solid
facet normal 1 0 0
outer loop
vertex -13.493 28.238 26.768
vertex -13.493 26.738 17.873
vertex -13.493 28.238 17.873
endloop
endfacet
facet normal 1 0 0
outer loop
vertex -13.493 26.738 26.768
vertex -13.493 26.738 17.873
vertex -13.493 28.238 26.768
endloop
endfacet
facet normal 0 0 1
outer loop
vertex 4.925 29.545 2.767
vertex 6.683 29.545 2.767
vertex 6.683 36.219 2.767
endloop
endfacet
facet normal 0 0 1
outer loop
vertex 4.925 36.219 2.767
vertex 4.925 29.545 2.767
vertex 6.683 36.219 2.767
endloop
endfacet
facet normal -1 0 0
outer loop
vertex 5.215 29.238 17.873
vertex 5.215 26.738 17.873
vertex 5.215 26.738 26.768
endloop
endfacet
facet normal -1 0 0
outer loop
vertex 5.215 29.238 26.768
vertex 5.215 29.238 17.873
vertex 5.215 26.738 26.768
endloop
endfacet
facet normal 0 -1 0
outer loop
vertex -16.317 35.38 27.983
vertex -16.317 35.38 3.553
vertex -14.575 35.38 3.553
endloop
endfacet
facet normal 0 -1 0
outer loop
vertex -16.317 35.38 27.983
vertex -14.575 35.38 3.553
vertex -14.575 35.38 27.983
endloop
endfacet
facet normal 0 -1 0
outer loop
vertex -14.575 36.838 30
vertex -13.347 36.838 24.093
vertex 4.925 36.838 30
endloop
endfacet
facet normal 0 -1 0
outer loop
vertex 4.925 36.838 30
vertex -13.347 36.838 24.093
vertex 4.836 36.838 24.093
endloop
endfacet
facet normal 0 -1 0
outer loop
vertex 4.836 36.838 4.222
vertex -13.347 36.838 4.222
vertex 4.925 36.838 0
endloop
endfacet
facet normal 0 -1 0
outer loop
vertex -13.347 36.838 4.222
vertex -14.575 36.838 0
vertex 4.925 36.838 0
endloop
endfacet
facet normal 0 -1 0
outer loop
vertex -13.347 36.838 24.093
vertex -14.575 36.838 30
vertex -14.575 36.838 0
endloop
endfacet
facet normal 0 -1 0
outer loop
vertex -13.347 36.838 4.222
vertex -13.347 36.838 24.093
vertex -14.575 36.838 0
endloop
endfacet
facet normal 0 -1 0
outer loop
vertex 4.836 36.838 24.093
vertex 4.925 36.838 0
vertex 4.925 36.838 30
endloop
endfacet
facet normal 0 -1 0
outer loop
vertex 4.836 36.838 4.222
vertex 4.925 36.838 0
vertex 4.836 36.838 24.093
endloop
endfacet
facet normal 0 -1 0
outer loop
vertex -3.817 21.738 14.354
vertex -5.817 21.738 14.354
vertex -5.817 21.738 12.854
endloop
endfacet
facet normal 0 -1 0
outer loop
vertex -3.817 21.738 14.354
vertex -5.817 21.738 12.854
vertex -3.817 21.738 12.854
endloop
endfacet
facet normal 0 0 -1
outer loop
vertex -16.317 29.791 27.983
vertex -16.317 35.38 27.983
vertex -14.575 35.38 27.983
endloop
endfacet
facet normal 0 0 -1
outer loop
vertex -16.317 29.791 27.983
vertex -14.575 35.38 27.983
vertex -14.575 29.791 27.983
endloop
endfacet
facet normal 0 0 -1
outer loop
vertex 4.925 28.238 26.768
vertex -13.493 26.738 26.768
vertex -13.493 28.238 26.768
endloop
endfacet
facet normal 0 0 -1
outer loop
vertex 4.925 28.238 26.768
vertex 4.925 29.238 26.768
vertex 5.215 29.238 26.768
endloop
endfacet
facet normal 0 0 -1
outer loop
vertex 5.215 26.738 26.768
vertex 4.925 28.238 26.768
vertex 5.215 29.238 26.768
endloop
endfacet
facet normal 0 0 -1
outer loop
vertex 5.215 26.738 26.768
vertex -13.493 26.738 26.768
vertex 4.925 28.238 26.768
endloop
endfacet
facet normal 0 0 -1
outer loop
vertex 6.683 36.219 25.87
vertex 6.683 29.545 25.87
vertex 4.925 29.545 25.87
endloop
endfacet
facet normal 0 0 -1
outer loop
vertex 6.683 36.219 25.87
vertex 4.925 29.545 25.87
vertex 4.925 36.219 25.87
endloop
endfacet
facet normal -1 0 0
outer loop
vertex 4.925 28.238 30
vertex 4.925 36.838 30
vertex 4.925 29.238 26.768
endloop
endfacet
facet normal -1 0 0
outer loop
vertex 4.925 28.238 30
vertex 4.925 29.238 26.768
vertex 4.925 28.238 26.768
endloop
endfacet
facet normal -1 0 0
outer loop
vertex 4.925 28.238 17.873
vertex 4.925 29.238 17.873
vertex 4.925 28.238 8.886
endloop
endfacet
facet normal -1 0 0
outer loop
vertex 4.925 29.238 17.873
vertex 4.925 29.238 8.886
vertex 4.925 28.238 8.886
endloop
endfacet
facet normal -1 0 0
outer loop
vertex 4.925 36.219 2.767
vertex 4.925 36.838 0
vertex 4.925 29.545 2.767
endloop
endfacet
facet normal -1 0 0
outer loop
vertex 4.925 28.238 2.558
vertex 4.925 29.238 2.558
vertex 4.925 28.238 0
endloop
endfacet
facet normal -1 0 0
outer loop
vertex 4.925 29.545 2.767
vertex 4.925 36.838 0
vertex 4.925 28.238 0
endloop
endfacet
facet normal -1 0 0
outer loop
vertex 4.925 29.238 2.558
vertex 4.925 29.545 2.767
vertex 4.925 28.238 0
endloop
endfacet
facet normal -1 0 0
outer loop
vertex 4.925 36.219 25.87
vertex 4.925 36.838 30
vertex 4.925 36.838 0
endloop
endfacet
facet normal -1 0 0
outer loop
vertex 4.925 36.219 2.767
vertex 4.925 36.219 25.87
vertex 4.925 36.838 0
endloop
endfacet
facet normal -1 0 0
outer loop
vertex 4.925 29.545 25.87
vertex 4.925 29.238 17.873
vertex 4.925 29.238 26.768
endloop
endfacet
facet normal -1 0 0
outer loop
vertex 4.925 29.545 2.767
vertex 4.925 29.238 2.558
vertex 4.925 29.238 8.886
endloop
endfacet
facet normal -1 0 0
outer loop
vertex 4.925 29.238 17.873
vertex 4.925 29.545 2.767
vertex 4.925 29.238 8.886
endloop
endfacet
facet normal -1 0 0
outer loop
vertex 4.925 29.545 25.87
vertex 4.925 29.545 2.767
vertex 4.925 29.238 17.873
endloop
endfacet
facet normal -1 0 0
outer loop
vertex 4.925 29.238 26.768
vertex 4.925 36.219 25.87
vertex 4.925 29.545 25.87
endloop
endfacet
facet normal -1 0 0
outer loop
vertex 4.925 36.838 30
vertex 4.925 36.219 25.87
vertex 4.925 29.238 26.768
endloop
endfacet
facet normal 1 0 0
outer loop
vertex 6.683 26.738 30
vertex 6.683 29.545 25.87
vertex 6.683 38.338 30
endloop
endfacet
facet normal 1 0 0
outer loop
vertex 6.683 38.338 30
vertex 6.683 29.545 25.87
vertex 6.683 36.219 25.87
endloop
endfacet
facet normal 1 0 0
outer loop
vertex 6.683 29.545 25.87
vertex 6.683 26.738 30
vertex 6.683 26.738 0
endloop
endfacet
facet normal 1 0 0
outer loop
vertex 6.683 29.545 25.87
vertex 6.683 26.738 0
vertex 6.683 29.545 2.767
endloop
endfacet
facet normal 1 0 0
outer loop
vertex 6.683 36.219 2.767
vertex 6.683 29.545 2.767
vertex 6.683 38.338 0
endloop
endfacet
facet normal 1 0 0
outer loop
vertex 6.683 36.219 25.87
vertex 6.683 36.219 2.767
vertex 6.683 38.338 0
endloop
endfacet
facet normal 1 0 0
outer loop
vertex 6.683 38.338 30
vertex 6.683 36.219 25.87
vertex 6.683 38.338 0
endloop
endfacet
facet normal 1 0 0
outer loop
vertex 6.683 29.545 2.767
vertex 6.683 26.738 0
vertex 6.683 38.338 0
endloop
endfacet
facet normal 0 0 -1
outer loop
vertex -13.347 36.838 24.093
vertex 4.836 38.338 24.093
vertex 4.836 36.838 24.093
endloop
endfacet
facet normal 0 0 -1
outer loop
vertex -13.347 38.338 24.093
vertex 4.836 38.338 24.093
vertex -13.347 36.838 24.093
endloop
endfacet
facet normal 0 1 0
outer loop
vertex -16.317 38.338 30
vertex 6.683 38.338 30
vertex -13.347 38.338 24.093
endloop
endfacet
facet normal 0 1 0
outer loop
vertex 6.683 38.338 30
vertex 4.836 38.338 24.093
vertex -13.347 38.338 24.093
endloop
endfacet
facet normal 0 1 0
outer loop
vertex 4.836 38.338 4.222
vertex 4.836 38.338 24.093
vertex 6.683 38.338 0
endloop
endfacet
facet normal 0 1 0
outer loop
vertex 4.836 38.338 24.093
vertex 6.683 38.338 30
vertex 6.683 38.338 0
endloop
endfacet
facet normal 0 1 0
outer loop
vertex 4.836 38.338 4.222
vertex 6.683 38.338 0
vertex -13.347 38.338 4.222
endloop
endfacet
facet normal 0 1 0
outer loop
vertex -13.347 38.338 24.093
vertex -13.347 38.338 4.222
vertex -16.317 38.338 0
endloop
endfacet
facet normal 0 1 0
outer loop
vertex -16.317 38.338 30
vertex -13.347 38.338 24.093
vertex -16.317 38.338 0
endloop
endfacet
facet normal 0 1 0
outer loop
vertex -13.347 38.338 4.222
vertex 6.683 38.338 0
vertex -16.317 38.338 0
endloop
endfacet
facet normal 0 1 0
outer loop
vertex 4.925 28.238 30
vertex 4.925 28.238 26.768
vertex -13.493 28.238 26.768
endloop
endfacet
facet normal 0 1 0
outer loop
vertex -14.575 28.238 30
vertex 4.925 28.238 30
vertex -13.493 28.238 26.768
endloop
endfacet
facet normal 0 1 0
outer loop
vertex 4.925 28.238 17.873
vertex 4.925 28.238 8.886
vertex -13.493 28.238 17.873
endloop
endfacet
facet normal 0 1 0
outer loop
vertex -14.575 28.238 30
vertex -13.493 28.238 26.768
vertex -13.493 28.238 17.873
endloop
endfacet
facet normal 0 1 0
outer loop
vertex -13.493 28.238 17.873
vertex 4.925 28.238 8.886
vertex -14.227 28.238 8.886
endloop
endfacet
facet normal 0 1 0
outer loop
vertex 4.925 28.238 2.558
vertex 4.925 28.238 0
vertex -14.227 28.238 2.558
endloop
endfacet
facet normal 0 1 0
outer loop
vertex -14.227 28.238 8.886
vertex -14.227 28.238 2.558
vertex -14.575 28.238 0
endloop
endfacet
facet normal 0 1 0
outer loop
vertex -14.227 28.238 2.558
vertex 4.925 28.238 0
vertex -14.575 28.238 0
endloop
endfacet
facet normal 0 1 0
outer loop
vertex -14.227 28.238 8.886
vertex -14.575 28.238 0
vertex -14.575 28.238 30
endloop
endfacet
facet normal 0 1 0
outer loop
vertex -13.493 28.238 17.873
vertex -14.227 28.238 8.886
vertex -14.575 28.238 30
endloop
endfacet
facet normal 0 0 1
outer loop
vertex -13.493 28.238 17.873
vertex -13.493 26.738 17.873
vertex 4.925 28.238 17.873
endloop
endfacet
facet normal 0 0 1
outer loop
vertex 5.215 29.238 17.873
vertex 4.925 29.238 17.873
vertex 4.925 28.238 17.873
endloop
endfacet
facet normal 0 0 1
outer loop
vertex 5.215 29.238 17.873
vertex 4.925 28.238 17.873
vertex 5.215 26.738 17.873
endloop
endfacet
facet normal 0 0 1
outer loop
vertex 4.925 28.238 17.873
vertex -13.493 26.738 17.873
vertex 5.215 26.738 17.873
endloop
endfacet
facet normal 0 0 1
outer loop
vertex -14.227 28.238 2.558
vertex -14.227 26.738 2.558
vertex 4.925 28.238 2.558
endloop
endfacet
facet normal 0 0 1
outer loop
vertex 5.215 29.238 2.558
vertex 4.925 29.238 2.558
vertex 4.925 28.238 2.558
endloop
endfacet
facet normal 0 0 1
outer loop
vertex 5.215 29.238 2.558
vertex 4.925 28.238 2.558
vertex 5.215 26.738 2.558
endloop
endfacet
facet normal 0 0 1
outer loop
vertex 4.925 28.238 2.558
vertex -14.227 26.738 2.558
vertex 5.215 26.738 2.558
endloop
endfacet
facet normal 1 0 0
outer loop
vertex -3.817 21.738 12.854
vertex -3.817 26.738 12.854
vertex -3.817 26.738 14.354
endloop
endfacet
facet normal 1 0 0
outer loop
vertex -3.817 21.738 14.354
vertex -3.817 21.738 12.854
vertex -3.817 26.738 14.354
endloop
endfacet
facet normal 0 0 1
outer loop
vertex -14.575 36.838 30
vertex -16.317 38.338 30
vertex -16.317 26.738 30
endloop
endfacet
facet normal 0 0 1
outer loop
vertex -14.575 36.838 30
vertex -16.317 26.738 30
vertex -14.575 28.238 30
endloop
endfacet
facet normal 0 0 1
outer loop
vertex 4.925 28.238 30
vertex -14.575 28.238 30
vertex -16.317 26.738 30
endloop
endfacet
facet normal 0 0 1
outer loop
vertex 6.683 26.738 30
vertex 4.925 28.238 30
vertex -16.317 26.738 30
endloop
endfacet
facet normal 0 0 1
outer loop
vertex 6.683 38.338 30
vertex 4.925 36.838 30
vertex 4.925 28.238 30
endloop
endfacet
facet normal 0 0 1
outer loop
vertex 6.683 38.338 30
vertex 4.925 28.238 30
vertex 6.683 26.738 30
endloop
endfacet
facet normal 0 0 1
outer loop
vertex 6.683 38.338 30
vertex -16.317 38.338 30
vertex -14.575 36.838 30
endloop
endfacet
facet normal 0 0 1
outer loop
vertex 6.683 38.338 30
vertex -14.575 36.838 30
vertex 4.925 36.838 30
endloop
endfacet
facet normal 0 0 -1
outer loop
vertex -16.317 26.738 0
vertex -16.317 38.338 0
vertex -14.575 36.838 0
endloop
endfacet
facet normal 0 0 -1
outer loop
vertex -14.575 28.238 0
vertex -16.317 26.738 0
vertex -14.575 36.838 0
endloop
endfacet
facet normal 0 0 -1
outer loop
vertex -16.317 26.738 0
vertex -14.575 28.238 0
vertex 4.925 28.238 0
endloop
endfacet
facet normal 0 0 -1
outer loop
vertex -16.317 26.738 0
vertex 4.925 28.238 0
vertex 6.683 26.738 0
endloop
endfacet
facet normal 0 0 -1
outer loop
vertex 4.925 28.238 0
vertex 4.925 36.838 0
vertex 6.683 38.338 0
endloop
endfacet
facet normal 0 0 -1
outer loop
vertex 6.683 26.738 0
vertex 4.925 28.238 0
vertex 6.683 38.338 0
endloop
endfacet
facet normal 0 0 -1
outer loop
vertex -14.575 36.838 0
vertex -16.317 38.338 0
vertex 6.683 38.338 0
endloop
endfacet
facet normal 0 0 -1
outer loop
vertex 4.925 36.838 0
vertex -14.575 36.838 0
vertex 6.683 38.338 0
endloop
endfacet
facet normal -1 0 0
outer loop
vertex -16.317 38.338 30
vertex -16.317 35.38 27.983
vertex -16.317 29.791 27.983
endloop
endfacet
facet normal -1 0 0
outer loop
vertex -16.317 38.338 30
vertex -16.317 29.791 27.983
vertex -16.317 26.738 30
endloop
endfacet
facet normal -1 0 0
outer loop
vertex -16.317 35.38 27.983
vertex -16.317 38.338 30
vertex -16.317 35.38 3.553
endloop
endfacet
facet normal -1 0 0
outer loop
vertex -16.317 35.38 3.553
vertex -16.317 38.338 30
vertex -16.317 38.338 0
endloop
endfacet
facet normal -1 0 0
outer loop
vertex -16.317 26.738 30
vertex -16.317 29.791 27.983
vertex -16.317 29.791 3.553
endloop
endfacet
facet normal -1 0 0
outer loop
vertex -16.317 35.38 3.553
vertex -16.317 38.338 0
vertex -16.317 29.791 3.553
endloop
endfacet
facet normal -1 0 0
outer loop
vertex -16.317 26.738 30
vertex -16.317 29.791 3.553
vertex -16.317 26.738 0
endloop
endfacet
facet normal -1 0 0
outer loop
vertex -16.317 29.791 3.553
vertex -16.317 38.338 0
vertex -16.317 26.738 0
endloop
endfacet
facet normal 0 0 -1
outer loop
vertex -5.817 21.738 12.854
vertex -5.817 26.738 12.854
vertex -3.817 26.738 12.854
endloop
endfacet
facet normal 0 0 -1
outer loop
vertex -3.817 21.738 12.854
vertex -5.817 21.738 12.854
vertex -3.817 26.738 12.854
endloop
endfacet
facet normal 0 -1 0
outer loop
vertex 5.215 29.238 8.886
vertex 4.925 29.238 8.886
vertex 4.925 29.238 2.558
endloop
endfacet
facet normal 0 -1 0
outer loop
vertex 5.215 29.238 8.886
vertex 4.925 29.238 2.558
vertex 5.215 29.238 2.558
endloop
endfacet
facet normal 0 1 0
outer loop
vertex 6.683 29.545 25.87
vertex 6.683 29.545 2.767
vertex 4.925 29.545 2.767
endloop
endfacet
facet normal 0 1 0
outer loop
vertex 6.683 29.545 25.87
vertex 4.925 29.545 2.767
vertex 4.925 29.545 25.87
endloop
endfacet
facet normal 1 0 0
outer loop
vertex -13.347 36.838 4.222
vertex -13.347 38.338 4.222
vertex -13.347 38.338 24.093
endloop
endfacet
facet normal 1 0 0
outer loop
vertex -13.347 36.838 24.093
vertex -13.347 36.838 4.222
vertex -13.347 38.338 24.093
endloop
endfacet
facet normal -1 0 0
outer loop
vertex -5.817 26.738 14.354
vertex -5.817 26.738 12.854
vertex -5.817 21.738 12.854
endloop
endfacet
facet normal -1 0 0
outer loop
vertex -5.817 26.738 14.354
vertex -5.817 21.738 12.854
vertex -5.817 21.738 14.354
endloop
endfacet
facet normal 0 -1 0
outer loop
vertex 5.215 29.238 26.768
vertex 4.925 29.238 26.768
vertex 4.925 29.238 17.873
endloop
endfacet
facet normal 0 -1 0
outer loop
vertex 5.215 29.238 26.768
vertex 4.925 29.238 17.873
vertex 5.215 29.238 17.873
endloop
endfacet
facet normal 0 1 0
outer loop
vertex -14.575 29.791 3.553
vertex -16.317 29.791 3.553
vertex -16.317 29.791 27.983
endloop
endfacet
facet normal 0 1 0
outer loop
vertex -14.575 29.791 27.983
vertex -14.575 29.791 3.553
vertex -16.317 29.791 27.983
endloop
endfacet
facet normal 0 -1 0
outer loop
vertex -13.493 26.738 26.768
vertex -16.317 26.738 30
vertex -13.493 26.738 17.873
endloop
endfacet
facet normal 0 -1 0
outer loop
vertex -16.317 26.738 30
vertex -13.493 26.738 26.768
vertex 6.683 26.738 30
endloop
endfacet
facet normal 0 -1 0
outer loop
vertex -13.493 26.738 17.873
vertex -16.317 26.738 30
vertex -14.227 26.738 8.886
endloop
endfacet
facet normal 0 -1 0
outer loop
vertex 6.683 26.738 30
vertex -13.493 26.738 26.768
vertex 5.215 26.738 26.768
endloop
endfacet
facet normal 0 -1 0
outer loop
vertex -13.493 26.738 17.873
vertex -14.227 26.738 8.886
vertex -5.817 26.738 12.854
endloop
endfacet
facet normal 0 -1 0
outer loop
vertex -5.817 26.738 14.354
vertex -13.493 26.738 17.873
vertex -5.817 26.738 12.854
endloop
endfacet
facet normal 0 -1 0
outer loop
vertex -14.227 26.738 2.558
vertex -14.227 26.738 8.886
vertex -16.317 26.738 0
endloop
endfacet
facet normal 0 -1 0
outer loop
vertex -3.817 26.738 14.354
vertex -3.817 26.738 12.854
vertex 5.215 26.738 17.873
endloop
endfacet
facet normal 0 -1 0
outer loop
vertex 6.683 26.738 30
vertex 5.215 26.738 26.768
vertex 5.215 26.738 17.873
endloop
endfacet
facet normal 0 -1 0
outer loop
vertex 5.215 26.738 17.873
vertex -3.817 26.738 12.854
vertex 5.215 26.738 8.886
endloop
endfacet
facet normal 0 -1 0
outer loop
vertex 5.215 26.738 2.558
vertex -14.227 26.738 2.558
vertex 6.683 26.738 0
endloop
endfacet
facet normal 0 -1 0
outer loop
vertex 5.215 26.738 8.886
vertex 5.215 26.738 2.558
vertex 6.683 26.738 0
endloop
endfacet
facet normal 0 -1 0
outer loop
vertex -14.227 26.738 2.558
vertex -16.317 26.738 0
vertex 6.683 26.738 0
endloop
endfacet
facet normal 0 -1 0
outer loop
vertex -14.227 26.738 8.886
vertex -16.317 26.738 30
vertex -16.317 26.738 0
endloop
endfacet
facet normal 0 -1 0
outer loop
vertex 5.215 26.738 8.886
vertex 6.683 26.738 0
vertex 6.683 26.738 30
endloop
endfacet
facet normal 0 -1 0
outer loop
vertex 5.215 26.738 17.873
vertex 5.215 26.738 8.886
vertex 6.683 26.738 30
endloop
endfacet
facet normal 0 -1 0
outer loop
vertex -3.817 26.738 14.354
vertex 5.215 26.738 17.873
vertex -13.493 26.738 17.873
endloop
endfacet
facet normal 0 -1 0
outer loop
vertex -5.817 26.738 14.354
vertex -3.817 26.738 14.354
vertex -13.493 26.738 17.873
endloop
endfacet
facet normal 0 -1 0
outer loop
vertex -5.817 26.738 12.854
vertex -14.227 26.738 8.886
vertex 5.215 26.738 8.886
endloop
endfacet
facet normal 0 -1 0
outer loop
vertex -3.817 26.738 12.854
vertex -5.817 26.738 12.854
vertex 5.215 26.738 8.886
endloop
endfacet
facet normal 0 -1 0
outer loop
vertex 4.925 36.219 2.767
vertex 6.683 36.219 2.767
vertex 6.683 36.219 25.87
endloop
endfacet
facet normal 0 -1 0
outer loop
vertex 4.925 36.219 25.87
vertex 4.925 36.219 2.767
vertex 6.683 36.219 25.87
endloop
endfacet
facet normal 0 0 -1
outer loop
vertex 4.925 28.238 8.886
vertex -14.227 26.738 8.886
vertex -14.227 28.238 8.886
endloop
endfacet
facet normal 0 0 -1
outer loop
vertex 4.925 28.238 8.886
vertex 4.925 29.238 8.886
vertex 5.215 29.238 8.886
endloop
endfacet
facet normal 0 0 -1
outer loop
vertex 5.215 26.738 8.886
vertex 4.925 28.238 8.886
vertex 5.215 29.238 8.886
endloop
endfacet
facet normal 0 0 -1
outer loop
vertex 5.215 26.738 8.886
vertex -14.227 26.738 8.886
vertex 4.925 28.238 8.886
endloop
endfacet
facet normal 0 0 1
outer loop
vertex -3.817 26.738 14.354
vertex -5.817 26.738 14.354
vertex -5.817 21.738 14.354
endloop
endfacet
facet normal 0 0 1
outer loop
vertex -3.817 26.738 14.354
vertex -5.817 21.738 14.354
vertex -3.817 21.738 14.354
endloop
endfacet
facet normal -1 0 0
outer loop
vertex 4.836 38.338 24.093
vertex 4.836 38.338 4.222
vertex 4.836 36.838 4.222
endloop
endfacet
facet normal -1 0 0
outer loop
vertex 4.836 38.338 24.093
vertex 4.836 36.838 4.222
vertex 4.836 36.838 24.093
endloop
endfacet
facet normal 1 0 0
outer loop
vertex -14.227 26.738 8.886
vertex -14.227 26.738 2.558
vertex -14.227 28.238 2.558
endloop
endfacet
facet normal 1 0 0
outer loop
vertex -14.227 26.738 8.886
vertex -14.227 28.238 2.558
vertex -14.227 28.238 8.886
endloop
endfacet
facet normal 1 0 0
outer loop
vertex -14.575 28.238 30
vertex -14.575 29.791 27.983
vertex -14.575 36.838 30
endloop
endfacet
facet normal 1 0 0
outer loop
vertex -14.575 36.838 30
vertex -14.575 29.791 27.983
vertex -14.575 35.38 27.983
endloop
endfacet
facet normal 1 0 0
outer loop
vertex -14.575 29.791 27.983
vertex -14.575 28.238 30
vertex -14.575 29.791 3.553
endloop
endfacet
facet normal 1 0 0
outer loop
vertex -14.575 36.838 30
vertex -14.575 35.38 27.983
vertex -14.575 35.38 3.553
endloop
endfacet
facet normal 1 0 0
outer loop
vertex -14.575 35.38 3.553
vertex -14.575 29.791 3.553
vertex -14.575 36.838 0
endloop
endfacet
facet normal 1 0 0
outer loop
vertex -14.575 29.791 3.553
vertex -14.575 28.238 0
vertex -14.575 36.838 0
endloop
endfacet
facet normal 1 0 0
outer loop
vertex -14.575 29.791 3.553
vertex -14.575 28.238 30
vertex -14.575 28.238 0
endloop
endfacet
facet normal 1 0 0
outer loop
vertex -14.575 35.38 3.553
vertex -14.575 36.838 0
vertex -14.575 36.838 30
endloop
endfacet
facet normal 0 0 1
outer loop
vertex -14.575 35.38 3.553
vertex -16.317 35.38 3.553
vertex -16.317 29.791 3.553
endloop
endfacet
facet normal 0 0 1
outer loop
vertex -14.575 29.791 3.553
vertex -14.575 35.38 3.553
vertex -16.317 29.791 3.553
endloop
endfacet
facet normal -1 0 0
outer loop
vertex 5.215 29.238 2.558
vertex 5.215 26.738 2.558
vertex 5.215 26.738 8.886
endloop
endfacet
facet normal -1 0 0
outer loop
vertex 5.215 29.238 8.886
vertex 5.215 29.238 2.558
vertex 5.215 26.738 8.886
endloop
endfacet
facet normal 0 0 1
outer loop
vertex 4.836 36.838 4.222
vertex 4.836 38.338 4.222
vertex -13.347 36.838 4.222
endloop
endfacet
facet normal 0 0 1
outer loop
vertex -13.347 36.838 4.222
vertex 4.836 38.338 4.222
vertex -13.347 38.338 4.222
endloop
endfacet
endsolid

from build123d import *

# Parameters (mm, degrees)
F1_DEPTH  = 30
F2_W      = 6.674083
F2_H      = 23.102594
F3_DEPTH  = 2.5
F4_W      = 5.588458
F4_H      = 24.429547
F5_DEPTH  = 2.5
F6_W      = 18.183109
F6_H      = 19.870534
F7_DEPTH  = 2.5
F8_W      = 19.441772
F8_H      = 6.327746
F8_W_2    = 18.70812
F8_H_2    = 8.895528
F9_DEPTH  = 2.5
F10_W     = 2
F10_H     = 1.5
F11_DEPTH = 5


with BuildPart() as f1:
    # F0 (on Top) → F1 (new body)
    with BuildSketch(Plane.XY):
        Polygon((-5.624948, 38.338026), (-16.317087, 38.338026), (-16.317087, 26.738026), (-3.303813, 26.738026), (-3.164812, 26.738026), (6.682913, 26.738026), (6.682913, 38.338026), (-5.508062, 38.338026), align=None)
        Polygon((-14.575047, 32.538026), (-14.575047, 36.838026), (-5.625147, 36.838026), (-5.508261, 36.838026), (4.924953, 36.838026), (4.924953, 28.238026), (-3.164812, 28.238026), (-3.303813, 28.238026), (-14.575047, 28.238026), (-14.575047, 32.102089), align=None, mode=Mode.SUBTRACT)
    extrude(amount=F1_DEPTH)

    # F2 (on face) → F3 (cut)
    with BuildSketch(Plane.YZ.offset(6.682913)):
        with Locations((32.882399, 14.318564)):
            Rectangle(F2_W, F2_H)
    extrude(amount=-F3_DEPTH, mode=Mode.SUBTRACT)

    # F4 (on face) → F5 (cut)
    with BuildSketch(Plane(origin=(-16.317087, 0, 0), x_dir=(0, -1, 0), z_dir=(-1, 0, 0))):
        with Locations((-32.585687, 15.768258)):
            Rectangle(F4_W, F4_H)
    extrude(amount=-F5_DEPTH, mode=Mode.SUBTRACT)

    # F6 (on face) → F7 (cut)
    with BuildSketch(Plane(origin=(0, 38.338026, 0), x_dir=(-1, 0, 0), z_dir=(0, 1, 0))):
        with Locations((4.255847, 14.15753)):
            Rectangle(F6_W, F6_H)
    extrude(amount=-F7_DEPTH, mode=Mode.SUBTRACT)

    # F8 (on face) → F9 (cut)
    with BuildSketch(Plane.XZ.offset(-26.738026)):
        with Locations((-4.50602, 5.721706)):
            Rectangle(F8_W, F8_H)
        with Locations((-4.139194, 22.320578)):
            Rectangle(F8_W_2, F8_H_2)
    extrude(amount=-F9_DEPTH, mode=Mode.SUBTRACT)

    # F10 (on face) → F11 (join)
    with BuildSketch(Plane.XZ.offset(-26.738026)):
        with Locations((-4.817087, 13.603965)):
            Rectangle(F10_W, F10_H)
    extrude(amount=F11_DEPTH)


solid = f1.part
